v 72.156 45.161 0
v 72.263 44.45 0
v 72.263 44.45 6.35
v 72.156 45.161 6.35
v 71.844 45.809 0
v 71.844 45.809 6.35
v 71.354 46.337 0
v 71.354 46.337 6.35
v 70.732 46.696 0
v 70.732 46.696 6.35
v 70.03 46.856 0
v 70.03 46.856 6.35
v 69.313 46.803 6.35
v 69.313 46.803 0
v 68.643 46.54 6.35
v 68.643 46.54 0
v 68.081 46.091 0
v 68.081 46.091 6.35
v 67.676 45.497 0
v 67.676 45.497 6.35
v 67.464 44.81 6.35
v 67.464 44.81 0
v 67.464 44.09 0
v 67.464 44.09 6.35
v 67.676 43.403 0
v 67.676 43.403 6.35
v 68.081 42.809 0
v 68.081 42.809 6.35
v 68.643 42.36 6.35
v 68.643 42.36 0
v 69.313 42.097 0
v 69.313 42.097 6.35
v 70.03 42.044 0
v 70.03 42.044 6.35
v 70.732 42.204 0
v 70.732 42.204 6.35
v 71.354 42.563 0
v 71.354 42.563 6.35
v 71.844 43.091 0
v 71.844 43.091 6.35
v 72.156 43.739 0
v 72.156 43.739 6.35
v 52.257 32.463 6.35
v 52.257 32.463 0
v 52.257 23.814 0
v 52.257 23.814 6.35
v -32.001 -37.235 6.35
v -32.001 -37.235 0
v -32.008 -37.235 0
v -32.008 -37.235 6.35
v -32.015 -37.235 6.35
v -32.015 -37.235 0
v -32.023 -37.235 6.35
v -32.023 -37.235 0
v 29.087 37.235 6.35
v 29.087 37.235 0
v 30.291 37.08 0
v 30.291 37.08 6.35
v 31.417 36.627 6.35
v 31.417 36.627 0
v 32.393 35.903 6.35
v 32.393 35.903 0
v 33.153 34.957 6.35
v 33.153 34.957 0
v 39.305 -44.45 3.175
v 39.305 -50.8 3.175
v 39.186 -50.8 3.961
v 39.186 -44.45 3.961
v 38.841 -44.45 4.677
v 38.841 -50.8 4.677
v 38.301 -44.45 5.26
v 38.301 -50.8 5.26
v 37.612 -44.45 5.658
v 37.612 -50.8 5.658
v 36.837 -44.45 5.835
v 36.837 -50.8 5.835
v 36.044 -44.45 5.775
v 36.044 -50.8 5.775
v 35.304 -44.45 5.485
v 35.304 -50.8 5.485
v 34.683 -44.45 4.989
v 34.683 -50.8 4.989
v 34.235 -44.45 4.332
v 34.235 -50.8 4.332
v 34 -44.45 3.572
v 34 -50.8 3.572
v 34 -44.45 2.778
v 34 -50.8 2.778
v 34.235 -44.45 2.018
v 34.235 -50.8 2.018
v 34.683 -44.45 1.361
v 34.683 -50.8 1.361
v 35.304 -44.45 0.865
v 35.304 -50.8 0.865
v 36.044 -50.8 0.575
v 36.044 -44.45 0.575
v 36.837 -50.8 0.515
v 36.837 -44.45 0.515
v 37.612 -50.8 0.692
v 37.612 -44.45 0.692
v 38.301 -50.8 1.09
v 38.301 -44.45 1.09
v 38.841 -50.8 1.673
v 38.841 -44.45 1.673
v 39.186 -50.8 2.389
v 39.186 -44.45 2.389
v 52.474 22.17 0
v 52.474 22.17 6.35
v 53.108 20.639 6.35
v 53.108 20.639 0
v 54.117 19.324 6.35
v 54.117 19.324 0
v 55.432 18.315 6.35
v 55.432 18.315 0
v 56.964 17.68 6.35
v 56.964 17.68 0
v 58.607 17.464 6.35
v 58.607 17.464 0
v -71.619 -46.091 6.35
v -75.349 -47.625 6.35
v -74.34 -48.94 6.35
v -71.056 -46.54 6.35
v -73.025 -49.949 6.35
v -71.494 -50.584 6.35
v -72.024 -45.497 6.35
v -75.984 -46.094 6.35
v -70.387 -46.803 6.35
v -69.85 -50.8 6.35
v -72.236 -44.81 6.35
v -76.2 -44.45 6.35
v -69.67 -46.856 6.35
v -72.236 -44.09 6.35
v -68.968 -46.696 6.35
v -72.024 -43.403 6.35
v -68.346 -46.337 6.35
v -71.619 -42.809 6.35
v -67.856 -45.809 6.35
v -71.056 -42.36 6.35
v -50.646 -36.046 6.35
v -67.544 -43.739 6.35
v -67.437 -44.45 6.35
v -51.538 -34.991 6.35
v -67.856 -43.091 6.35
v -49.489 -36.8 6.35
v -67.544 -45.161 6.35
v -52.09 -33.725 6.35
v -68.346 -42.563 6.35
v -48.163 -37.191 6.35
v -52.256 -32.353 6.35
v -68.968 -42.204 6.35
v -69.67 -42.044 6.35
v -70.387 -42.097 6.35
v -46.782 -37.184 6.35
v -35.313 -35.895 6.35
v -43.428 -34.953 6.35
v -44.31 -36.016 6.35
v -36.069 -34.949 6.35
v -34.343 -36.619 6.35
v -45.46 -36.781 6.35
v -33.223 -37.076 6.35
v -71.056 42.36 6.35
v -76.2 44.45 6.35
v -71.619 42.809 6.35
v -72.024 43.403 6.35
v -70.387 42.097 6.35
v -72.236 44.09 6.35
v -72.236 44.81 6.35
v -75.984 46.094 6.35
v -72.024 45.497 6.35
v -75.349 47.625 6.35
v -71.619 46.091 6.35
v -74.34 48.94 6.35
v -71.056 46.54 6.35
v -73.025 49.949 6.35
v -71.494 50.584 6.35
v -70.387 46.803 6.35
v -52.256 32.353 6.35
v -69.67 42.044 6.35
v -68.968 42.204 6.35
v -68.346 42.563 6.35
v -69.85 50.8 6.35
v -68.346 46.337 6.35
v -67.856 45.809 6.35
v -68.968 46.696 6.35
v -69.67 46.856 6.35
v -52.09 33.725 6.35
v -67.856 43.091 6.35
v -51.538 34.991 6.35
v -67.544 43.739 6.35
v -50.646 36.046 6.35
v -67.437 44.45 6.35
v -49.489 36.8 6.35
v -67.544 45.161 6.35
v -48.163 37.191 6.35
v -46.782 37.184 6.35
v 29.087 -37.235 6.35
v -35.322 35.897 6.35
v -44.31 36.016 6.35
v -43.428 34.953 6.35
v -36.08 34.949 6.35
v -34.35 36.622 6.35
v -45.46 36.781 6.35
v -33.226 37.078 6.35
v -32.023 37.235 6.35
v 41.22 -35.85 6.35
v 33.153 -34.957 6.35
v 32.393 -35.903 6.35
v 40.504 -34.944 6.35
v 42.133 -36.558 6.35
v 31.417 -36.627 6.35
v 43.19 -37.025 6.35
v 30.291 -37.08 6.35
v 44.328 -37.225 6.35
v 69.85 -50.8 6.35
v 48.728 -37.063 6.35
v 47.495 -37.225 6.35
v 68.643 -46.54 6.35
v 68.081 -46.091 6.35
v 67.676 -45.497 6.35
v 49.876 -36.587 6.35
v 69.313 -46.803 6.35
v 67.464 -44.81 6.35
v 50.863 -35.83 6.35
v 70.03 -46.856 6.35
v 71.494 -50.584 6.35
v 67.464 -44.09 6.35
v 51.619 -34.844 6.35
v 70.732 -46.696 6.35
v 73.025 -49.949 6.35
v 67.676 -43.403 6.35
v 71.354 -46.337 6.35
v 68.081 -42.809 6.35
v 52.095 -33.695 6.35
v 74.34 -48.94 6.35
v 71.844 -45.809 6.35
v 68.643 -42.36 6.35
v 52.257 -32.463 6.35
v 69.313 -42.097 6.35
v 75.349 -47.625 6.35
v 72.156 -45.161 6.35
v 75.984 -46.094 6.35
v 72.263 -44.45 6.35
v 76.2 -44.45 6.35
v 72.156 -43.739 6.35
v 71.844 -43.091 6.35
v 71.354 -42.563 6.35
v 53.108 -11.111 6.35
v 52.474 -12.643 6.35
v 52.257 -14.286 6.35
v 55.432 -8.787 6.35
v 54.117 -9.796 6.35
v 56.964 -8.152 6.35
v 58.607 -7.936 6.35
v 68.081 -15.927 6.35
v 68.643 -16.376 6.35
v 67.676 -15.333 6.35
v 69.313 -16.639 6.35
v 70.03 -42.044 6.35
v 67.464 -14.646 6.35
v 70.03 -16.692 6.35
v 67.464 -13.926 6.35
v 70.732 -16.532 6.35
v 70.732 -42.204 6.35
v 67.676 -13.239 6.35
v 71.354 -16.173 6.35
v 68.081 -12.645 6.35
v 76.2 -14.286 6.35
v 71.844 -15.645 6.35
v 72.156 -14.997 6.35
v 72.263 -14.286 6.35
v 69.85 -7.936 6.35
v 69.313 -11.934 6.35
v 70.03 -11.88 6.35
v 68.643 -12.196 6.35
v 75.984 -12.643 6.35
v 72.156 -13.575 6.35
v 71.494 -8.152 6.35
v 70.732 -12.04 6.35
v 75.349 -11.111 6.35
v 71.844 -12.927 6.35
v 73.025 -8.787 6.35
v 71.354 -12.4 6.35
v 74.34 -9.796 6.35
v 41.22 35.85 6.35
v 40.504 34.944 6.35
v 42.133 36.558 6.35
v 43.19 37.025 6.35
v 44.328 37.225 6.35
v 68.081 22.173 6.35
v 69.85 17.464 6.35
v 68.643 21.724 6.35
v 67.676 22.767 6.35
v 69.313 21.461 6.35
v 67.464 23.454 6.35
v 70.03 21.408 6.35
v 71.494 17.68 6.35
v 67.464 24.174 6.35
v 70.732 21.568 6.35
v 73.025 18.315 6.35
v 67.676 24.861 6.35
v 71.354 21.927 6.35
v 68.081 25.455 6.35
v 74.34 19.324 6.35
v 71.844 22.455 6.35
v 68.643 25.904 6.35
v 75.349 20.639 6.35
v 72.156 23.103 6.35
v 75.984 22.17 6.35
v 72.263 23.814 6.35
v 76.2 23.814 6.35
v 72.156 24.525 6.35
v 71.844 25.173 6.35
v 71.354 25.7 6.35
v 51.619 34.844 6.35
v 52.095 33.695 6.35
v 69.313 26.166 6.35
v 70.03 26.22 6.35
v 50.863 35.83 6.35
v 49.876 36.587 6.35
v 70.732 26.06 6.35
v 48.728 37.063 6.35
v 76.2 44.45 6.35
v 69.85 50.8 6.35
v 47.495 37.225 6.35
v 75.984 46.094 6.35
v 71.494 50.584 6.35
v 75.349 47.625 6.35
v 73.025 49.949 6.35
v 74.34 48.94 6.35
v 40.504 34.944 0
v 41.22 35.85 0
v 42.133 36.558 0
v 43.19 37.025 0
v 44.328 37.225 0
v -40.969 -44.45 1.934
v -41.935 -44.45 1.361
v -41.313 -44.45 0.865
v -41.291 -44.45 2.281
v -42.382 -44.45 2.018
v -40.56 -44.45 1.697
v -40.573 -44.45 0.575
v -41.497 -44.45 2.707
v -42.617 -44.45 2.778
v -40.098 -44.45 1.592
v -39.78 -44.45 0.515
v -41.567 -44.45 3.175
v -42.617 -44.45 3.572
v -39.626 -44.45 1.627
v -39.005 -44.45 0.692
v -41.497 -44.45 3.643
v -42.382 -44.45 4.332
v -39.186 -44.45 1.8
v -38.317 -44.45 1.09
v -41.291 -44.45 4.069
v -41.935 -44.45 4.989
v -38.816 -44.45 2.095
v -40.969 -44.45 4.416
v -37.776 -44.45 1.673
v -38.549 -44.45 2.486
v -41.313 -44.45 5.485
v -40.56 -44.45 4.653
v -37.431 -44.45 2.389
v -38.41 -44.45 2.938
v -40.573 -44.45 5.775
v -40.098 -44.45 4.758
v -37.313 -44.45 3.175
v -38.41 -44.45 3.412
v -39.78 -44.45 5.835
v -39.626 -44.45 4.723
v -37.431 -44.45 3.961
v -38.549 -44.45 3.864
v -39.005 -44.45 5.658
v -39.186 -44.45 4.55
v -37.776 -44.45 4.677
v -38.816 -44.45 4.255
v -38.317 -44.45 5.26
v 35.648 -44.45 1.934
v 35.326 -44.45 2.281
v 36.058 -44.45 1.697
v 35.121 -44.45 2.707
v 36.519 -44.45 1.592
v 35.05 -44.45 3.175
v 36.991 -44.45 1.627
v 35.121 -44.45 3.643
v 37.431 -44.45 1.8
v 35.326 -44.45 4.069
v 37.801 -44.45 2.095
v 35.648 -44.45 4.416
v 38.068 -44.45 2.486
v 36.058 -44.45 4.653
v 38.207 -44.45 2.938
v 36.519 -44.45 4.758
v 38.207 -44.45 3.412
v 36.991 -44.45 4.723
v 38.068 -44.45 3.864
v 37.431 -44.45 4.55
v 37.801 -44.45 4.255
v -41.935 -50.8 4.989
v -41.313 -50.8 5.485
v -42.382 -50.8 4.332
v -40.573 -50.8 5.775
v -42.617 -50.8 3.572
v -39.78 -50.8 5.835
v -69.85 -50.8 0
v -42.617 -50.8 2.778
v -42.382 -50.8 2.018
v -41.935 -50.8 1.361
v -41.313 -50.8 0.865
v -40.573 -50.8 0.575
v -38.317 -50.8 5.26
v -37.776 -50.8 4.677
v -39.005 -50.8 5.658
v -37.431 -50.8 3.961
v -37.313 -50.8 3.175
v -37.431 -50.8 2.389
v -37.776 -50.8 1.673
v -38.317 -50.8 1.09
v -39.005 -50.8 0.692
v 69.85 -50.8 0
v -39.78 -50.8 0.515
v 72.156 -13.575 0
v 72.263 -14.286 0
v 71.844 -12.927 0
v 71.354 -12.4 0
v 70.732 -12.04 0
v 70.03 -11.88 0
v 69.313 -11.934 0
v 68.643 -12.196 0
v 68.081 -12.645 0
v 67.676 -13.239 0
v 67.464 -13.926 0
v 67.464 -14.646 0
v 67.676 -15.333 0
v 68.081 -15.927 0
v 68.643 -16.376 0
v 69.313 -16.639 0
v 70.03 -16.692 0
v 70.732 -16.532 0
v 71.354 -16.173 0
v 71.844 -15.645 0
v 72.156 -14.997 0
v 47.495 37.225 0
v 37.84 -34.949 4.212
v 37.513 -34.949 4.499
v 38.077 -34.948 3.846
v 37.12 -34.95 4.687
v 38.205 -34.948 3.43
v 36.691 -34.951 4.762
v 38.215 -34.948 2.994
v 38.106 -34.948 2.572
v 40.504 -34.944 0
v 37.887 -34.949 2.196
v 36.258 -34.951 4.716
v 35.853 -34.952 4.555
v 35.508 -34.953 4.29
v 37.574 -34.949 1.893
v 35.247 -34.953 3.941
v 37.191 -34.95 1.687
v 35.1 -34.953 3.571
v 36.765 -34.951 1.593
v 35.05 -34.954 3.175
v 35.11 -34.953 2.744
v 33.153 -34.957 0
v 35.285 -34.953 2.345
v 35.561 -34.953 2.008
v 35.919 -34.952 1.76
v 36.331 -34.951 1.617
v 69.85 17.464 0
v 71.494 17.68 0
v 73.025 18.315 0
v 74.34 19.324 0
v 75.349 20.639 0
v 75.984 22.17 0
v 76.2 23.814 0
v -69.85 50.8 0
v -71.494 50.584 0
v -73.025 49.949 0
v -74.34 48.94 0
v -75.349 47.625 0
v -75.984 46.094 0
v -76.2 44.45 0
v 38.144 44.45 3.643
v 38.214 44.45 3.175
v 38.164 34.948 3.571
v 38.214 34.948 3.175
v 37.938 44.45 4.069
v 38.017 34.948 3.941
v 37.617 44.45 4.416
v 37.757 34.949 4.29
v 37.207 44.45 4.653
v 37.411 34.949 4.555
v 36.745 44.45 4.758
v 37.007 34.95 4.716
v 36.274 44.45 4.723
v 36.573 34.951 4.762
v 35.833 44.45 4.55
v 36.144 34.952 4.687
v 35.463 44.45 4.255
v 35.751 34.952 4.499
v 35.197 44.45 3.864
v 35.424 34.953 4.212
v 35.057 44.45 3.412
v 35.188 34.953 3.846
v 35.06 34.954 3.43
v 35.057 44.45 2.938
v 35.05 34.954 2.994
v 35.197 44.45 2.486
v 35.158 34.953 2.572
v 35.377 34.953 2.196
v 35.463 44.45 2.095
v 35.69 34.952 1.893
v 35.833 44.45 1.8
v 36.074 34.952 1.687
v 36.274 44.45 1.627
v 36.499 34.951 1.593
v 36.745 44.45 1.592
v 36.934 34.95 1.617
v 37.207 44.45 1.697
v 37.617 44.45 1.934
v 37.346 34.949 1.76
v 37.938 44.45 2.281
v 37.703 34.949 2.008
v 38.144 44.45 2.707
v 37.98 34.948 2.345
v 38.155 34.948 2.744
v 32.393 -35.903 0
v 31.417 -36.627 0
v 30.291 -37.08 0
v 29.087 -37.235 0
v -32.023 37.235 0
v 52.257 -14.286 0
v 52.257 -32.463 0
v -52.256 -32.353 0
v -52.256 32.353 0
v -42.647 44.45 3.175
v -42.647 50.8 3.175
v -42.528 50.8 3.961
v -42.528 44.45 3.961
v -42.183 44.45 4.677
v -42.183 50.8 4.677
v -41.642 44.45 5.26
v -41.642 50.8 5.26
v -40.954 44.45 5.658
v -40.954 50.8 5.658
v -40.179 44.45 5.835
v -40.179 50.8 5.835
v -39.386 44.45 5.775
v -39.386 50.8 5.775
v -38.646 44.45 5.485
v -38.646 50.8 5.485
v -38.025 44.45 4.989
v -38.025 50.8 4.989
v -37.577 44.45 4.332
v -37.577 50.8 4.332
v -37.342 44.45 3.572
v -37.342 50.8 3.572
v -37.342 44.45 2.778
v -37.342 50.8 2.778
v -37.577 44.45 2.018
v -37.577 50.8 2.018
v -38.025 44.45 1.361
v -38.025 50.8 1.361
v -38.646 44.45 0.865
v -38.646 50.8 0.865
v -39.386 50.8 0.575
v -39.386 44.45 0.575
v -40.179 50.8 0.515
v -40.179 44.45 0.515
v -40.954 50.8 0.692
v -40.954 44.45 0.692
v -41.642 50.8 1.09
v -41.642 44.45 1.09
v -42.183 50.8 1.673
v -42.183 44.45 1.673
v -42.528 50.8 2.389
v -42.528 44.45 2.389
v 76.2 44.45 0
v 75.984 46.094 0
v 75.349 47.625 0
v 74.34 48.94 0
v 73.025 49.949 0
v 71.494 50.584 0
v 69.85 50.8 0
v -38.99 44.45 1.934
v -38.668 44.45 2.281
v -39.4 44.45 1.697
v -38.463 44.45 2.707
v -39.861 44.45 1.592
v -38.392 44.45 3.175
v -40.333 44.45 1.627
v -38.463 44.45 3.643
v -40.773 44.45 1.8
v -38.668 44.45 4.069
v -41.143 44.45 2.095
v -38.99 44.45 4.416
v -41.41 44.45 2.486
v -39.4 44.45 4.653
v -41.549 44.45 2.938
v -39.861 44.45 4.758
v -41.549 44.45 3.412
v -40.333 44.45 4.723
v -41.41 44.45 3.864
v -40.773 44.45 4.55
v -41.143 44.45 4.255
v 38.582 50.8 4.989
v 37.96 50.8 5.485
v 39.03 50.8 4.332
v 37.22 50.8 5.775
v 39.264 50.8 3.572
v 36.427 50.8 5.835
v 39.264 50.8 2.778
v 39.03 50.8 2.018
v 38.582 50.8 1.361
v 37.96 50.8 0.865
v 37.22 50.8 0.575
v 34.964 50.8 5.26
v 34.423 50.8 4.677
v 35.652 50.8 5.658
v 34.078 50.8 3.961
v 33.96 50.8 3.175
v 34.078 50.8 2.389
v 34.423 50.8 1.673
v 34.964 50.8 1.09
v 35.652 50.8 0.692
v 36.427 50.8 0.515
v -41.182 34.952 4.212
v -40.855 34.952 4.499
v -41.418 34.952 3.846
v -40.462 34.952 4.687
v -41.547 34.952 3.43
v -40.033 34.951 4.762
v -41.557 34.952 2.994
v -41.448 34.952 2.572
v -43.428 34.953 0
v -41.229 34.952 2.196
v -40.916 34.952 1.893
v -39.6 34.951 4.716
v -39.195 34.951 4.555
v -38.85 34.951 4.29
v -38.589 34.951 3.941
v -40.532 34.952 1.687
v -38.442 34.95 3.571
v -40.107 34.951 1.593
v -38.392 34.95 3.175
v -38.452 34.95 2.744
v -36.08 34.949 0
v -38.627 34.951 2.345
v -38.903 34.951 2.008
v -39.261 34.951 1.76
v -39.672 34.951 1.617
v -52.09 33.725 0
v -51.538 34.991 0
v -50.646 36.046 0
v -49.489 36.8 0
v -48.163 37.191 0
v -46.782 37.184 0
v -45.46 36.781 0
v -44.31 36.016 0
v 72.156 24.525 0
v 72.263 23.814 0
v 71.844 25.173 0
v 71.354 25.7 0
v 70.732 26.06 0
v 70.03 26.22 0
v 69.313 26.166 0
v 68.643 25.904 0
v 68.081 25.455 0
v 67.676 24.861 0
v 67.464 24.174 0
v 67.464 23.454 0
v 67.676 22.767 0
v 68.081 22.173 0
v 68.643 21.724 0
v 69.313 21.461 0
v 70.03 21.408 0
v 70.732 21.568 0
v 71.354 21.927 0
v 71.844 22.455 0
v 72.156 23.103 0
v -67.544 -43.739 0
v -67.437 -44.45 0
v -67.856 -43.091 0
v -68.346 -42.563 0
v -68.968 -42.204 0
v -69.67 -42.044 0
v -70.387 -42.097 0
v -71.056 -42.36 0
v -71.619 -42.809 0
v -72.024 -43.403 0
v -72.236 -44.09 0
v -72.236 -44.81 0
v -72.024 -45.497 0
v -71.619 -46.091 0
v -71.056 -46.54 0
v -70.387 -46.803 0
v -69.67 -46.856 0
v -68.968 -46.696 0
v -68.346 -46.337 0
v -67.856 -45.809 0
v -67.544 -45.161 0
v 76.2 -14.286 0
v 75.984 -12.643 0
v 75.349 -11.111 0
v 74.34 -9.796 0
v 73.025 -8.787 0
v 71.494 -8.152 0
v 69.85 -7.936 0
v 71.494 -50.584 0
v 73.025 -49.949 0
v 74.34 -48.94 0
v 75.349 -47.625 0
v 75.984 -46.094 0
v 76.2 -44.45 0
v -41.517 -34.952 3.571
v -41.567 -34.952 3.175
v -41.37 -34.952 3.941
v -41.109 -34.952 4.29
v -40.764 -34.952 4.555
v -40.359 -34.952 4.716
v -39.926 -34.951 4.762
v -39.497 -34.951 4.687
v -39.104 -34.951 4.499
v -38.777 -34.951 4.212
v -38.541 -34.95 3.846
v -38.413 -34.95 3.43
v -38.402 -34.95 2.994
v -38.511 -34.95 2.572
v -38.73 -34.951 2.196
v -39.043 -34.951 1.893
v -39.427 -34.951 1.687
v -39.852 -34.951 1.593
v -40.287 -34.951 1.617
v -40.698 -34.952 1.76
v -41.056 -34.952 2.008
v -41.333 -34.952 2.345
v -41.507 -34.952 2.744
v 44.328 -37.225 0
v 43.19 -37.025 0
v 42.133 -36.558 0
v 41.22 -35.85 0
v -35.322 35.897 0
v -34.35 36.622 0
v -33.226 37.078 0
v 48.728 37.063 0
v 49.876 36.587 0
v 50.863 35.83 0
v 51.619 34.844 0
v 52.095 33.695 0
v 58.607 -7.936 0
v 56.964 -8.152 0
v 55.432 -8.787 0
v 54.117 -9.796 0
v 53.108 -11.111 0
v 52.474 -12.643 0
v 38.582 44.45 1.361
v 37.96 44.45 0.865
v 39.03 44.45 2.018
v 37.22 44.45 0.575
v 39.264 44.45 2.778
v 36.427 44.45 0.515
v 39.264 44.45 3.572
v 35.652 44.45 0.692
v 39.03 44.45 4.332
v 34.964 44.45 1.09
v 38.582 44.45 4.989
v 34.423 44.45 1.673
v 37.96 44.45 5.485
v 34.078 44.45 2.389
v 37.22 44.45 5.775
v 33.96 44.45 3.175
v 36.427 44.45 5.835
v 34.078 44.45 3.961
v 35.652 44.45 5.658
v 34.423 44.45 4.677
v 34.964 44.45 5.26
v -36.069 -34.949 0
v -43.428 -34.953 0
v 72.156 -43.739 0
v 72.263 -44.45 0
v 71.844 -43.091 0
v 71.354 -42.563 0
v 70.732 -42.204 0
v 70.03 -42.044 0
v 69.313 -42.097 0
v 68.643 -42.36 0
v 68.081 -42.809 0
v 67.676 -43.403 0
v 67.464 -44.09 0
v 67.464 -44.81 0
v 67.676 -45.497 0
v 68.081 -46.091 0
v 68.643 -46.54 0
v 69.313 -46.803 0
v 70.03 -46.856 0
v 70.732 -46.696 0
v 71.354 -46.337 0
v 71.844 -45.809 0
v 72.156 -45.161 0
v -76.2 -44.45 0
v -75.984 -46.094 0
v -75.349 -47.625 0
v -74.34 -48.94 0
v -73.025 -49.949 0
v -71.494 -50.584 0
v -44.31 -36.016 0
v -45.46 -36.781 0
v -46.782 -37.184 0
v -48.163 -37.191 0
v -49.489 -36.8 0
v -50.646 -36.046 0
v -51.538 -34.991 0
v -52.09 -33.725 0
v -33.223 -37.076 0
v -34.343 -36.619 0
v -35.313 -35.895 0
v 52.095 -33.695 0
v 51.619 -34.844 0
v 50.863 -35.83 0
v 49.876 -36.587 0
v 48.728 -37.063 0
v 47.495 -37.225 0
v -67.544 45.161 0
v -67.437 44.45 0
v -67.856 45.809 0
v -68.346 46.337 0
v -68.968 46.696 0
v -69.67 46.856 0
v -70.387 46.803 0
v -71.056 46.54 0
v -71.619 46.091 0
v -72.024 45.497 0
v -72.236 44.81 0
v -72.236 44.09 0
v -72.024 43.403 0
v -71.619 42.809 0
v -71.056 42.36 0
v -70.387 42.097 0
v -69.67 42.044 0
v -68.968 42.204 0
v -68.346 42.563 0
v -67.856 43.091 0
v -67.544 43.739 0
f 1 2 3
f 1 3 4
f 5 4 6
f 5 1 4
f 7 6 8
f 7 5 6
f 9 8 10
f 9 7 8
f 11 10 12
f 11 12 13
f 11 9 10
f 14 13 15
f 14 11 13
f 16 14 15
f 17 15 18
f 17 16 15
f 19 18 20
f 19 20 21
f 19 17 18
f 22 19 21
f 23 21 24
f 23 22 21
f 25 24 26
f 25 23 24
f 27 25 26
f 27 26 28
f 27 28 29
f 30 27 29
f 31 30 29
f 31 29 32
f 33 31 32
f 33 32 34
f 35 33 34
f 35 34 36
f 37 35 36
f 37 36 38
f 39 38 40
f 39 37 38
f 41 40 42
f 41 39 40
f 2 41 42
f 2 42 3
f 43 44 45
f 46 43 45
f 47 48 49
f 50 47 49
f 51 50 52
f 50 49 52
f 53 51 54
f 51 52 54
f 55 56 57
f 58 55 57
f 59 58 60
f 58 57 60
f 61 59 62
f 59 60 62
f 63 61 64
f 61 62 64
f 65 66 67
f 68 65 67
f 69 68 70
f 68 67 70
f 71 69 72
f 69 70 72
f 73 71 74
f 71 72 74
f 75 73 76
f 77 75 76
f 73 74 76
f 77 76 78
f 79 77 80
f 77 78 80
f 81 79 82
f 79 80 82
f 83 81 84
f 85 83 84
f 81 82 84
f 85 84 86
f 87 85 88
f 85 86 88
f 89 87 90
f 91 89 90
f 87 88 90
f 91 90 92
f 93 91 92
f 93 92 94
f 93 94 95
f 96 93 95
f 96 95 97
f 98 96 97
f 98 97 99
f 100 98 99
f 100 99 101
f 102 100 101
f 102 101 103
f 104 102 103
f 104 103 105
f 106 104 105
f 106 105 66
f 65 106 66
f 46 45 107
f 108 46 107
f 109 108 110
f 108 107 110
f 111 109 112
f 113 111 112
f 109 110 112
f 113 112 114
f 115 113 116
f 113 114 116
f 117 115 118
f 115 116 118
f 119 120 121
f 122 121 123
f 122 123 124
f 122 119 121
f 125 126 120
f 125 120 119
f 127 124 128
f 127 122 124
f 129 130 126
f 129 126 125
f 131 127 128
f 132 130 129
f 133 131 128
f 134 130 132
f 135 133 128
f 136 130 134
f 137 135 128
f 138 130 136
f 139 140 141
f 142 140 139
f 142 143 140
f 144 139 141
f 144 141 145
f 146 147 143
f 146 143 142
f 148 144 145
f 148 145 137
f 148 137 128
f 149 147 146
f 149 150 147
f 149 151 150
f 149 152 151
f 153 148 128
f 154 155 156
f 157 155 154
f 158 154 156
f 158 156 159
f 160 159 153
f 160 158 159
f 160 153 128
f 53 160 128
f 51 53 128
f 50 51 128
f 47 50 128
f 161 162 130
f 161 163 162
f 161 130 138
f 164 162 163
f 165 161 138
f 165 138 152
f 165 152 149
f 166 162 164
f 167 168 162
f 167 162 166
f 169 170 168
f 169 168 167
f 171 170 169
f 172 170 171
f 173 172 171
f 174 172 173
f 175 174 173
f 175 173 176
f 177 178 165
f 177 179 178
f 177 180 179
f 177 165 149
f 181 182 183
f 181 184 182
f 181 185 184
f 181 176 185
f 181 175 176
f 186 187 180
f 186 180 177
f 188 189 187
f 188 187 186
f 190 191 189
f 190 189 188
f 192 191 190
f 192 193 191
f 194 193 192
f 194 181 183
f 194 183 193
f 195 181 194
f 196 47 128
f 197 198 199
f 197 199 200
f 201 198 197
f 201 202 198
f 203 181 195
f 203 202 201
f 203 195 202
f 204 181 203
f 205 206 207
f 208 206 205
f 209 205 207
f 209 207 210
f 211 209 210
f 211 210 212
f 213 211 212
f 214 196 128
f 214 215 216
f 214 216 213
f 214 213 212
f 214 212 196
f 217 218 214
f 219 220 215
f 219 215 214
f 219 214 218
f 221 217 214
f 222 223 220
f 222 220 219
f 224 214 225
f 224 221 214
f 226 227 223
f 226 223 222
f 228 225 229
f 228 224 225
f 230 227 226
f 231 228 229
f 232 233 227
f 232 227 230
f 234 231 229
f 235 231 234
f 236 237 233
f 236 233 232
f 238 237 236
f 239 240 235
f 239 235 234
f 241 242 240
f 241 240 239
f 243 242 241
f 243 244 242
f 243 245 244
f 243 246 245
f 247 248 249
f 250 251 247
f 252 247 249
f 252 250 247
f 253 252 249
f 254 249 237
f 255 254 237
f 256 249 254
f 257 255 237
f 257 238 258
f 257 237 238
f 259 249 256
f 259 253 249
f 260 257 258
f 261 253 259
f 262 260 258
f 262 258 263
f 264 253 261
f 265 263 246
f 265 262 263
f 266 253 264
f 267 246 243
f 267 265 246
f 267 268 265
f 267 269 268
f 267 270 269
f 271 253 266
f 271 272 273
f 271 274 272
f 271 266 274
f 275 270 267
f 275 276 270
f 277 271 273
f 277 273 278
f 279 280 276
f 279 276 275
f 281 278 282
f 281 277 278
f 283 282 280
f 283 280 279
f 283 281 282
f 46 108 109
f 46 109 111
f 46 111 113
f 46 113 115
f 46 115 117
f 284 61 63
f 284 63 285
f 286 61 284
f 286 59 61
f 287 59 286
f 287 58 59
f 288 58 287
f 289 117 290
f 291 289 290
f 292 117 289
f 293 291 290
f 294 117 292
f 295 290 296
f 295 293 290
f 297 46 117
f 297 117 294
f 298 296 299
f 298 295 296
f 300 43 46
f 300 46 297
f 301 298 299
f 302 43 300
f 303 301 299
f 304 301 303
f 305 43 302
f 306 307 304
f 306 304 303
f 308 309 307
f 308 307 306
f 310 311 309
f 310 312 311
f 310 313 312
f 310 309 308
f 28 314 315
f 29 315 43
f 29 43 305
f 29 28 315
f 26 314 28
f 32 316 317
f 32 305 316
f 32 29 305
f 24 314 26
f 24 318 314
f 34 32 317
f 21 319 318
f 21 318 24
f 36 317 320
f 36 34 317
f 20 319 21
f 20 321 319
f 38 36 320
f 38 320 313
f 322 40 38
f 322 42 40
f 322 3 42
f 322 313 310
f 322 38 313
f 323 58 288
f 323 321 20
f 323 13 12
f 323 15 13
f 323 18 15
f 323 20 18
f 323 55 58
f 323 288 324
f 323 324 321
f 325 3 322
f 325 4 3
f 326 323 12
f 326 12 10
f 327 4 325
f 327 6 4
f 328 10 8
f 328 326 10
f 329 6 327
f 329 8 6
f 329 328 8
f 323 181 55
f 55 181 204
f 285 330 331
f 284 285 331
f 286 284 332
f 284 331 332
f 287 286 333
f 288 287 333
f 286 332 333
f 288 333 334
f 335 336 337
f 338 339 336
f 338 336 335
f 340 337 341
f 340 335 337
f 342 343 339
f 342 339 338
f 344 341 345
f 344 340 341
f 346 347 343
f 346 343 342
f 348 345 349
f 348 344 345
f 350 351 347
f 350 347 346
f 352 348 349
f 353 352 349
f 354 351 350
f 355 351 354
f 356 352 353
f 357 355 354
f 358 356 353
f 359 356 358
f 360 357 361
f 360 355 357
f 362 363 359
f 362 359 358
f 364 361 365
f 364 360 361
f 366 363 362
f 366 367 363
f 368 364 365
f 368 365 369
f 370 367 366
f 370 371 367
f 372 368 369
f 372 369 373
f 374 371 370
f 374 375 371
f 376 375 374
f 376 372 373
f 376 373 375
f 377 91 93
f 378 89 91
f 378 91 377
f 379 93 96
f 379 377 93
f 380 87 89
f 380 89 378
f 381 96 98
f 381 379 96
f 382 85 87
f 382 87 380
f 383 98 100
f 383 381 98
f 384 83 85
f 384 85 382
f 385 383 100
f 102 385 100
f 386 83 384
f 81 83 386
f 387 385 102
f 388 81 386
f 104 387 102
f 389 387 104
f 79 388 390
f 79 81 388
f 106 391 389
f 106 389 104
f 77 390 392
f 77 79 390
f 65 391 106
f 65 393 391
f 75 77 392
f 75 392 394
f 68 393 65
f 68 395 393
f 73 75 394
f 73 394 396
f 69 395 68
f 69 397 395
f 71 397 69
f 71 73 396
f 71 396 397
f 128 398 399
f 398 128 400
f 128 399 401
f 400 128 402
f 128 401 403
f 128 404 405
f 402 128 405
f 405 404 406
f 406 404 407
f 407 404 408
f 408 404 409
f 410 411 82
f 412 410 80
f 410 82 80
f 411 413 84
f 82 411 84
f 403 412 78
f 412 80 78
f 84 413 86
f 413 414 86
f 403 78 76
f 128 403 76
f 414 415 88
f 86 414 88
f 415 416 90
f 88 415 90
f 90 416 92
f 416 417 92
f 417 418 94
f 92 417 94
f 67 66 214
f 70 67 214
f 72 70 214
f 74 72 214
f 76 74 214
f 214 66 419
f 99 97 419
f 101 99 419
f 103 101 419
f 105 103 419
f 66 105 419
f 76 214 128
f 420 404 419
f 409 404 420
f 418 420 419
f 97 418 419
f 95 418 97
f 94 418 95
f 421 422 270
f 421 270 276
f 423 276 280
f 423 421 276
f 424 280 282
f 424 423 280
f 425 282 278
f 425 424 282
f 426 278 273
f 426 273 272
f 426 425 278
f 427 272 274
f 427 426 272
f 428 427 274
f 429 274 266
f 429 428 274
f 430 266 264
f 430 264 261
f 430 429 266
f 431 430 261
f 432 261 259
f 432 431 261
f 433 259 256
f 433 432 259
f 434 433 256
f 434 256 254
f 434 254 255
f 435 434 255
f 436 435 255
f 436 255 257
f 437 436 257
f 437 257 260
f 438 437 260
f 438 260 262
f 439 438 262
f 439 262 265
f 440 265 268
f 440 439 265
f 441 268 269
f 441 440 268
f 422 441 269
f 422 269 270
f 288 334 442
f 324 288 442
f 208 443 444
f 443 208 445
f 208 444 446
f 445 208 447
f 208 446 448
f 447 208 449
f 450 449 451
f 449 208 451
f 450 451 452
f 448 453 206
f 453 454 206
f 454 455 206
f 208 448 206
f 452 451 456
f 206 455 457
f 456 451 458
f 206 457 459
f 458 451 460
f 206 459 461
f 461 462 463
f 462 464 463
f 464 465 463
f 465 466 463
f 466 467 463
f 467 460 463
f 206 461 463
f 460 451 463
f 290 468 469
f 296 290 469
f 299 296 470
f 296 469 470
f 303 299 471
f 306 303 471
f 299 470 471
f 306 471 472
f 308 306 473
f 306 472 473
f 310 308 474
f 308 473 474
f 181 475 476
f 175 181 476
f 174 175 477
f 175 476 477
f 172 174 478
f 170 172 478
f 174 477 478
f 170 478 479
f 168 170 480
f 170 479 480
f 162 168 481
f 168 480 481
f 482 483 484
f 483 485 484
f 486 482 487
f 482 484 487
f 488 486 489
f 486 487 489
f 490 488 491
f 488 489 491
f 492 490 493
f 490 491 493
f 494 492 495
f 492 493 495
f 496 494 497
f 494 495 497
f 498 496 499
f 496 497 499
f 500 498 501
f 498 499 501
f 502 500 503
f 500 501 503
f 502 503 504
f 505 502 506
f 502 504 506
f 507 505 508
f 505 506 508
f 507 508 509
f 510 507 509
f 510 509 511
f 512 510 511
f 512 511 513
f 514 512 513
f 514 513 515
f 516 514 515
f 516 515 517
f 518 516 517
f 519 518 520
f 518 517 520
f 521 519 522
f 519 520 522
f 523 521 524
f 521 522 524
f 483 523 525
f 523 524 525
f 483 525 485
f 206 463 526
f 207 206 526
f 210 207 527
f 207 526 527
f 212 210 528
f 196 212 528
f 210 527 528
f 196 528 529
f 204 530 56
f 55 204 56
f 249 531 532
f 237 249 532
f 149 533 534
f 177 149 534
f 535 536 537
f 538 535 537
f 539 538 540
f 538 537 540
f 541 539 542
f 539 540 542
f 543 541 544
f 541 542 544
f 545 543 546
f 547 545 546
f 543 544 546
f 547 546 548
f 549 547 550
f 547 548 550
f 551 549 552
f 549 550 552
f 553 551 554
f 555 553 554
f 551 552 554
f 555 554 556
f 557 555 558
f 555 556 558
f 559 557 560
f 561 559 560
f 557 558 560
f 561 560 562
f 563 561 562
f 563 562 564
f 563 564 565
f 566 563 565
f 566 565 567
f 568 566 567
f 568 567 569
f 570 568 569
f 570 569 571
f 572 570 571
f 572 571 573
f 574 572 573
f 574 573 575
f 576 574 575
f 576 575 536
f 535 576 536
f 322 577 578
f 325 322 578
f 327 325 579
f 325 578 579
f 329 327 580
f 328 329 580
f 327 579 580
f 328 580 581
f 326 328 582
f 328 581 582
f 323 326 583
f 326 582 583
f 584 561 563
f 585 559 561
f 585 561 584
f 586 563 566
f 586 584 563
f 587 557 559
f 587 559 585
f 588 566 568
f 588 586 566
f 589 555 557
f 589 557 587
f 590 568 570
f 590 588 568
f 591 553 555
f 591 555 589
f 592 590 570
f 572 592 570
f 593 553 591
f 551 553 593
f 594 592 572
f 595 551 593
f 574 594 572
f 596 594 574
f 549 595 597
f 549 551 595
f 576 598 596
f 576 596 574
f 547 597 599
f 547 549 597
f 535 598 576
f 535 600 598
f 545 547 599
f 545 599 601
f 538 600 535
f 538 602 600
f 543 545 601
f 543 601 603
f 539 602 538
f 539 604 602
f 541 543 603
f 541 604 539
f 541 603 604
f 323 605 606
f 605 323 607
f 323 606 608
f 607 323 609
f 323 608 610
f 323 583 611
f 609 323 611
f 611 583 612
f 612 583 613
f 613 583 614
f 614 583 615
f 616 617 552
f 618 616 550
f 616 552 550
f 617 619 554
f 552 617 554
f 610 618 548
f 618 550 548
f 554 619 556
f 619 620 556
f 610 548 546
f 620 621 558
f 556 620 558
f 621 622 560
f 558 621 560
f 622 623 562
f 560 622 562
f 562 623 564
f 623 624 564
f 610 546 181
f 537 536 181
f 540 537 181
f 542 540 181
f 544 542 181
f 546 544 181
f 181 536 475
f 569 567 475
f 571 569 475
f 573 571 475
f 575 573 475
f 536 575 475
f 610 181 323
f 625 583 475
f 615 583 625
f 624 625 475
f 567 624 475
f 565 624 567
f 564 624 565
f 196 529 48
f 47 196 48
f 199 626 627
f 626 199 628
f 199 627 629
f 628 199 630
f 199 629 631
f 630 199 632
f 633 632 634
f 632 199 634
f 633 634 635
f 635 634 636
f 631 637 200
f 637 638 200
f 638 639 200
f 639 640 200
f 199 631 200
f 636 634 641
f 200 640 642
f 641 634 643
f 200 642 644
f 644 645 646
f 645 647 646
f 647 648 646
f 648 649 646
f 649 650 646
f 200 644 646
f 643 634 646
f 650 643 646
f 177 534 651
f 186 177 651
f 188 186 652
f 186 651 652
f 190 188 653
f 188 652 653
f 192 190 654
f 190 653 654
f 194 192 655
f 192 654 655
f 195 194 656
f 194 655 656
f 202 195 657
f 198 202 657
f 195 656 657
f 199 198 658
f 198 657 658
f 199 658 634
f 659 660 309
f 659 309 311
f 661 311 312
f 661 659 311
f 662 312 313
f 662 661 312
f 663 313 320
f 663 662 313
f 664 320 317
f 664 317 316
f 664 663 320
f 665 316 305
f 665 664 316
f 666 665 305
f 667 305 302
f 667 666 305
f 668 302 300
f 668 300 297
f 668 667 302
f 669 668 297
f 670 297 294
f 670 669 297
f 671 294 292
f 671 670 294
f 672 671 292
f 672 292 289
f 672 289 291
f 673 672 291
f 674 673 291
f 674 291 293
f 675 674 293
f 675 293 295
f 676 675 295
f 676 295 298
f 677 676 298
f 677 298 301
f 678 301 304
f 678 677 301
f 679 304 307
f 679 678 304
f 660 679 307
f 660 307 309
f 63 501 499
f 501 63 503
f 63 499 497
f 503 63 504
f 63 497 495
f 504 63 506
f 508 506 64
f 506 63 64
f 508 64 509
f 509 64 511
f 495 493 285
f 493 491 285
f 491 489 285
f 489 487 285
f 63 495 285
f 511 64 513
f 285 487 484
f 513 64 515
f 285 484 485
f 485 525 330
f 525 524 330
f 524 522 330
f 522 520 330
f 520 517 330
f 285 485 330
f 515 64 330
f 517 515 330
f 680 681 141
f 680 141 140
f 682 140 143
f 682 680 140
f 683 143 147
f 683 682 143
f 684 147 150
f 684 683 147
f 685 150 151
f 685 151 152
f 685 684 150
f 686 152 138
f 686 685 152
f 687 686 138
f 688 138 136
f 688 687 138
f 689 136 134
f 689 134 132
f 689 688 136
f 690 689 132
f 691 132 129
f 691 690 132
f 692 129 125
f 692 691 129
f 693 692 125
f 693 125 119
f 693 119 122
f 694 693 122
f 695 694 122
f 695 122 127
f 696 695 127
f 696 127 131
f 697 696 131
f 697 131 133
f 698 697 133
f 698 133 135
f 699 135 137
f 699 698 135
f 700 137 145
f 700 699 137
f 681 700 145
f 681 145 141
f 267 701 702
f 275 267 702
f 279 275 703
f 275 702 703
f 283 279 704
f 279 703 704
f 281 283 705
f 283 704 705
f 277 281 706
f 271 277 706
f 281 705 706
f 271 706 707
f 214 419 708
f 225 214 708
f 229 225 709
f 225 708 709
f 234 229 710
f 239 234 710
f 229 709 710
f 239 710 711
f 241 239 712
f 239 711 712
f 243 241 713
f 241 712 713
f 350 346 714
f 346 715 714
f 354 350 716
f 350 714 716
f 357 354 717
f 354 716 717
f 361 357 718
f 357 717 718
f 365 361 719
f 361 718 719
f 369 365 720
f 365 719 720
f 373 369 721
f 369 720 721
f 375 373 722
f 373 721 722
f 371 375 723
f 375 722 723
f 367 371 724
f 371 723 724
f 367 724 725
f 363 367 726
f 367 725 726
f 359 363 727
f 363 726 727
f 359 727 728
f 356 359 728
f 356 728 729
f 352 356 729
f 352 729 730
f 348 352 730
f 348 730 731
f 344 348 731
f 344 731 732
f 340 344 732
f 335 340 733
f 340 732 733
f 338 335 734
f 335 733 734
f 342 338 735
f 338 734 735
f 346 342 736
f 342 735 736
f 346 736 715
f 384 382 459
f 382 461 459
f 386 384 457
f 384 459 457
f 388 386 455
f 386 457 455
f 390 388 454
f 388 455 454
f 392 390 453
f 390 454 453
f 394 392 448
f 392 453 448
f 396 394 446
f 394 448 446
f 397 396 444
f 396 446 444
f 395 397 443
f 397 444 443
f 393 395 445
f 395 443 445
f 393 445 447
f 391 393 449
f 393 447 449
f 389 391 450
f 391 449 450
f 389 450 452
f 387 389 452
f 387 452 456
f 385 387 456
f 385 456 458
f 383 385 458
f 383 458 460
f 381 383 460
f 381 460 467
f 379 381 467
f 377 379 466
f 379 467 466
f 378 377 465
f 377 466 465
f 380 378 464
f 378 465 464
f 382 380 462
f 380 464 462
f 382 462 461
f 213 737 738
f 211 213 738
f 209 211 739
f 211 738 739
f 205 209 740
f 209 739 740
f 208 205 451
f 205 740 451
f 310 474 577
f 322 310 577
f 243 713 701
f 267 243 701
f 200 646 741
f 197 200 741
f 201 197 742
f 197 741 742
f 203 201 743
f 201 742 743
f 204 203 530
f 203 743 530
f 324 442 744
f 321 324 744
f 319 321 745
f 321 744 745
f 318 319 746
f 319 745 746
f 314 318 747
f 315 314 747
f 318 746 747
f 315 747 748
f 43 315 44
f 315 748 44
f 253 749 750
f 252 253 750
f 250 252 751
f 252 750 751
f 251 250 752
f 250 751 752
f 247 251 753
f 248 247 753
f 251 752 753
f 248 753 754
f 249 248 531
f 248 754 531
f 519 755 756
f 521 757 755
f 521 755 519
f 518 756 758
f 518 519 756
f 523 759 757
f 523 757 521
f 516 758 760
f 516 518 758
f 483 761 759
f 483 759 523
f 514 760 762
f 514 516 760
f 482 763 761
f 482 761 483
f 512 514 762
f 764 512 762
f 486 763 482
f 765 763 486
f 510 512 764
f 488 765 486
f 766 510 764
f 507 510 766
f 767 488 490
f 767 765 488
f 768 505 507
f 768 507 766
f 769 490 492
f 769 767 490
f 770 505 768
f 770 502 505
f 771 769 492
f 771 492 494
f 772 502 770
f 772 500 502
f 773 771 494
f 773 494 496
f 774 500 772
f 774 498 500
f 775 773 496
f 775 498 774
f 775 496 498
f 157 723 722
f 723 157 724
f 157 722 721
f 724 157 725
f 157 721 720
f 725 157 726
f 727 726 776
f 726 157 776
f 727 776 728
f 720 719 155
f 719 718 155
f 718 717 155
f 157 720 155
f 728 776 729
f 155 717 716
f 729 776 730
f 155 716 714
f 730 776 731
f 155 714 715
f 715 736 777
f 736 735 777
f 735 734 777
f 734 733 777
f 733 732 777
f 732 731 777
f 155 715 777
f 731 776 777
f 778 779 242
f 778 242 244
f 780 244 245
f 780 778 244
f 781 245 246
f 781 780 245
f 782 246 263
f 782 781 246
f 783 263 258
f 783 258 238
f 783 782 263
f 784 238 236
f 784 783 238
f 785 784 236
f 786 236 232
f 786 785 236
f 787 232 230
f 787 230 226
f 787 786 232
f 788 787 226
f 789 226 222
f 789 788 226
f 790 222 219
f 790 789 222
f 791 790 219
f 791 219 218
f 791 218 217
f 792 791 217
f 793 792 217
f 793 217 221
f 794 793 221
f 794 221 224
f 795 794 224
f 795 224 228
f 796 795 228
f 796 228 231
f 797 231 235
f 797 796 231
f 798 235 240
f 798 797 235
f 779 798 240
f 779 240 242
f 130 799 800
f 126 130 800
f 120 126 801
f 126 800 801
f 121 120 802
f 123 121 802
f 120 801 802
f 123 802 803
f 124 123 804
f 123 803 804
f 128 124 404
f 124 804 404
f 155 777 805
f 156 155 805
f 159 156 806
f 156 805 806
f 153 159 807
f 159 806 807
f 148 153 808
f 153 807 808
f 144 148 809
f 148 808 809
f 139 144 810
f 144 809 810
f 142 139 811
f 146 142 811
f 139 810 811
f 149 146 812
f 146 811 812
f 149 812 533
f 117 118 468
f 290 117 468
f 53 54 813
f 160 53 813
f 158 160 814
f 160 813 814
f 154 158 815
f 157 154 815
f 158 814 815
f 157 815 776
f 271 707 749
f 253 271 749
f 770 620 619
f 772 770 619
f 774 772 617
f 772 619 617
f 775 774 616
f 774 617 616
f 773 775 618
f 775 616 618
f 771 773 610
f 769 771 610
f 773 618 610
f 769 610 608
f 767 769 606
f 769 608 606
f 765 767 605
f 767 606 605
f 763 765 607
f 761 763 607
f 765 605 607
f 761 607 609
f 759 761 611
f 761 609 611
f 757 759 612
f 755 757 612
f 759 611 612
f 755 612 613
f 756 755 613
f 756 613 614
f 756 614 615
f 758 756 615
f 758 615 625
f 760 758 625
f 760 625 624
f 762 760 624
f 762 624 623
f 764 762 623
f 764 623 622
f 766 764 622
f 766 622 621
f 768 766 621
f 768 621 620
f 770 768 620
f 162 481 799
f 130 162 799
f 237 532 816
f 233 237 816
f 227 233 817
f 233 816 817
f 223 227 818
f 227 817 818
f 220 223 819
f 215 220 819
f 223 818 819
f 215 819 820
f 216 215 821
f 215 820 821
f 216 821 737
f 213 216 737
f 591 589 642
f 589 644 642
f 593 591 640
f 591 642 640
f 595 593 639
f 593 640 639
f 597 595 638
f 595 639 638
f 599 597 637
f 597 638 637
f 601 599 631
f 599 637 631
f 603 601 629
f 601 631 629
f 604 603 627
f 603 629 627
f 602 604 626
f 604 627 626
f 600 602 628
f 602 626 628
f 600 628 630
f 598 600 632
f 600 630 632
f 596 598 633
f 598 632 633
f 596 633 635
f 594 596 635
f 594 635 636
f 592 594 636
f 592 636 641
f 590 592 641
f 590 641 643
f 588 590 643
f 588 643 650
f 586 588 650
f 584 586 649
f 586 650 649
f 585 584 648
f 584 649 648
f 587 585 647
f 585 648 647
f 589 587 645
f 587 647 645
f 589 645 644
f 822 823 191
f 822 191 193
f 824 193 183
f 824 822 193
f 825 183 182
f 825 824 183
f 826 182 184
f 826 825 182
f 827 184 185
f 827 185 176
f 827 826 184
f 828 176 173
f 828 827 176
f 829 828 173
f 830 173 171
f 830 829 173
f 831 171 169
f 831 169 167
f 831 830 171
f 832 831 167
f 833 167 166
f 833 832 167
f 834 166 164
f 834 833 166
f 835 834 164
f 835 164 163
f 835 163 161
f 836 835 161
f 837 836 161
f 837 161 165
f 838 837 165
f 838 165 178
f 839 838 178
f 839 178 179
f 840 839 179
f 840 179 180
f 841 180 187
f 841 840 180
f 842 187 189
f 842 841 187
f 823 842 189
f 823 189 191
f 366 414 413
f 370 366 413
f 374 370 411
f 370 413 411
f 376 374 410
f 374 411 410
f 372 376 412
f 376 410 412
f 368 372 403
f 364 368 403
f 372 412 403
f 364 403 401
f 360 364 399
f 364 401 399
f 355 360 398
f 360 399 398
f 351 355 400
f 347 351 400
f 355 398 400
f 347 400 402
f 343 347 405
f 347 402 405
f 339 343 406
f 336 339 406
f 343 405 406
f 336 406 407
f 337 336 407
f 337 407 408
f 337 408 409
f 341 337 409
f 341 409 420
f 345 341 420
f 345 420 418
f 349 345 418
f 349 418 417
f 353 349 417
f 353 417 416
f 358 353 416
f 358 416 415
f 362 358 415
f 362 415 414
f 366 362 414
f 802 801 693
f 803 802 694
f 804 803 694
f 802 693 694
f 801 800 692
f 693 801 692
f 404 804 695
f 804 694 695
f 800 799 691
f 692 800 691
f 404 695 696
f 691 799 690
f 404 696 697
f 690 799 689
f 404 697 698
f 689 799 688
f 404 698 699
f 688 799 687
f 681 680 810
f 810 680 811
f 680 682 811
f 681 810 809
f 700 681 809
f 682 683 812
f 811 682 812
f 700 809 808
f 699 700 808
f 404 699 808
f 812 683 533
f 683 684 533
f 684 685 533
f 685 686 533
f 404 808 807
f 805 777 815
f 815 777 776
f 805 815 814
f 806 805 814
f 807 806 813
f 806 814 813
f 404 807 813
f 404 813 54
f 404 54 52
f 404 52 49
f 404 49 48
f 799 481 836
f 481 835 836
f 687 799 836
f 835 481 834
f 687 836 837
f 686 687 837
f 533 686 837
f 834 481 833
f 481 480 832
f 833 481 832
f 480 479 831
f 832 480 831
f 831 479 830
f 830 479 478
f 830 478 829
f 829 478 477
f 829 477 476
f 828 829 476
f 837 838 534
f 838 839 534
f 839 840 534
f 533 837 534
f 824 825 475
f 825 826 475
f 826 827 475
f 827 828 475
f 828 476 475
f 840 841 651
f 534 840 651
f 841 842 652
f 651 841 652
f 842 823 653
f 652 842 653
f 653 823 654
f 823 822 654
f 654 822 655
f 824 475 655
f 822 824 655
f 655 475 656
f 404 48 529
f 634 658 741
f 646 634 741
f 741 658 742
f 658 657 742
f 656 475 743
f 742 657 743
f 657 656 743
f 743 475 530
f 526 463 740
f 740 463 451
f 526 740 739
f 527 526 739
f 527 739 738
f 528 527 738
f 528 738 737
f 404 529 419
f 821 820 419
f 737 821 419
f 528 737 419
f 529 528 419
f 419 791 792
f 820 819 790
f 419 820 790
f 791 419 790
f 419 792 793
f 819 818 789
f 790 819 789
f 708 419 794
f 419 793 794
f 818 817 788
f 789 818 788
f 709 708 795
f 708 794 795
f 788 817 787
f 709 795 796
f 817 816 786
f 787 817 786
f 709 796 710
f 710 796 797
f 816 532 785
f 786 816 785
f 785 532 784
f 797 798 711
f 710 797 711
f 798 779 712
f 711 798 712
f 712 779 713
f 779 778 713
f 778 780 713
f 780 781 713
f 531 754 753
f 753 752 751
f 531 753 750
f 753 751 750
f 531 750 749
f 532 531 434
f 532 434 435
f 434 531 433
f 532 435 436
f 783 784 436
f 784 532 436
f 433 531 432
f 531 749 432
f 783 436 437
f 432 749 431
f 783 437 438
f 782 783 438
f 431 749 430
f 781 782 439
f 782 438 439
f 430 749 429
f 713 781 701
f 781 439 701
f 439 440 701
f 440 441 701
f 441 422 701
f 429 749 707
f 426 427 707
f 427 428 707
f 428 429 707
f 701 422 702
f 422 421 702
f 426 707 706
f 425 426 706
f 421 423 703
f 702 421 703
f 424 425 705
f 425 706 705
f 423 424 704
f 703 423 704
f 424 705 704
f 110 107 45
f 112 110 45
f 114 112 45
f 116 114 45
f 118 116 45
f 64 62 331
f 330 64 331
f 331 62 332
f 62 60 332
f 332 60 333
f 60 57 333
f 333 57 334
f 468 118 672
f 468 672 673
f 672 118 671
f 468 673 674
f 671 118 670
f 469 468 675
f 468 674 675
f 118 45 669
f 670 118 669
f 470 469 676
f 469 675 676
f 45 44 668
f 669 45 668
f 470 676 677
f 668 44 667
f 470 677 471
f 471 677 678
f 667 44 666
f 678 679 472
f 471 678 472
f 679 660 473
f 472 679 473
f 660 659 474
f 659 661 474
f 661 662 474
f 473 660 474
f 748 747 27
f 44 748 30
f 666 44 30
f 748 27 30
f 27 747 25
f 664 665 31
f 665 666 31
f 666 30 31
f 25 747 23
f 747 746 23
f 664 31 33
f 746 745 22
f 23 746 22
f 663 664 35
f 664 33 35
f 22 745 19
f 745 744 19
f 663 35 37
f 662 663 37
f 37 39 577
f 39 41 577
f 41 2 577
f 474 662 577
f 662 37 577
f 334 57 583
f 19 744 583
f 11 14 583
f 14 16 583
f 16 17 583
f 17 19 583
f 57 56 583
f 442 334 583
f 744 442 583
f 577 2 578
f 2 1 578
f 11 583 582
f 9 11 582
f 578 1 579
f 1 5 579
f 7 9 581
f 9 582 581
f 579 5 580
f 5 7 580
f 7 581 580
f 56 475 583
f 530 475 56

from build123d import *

# Parameters (mm, degrees)
F0_R           = 2.413
F1_DEPTH       = 6.35
F3_D           = 3.175
F3_DEPTH       = 15.875
F3_CBORE_D     = 5.334
F3_CBORE_DEPTH = 6.35
F3_TIP         = 0.9538662327
F5_D           = 3.175
F5_DEPTH       = 15.875
F5_CBORE_D     = 5.334
F5_CBORE_DEPTH = 6.35
F5_TIP         = 0.9538662327


# Not quite as in the source:
# - ends of sketch curves that miss each other by under 0.0002 mm in the source are joined


with BuildPart() as f1:
    # F0 (on Top) → F1 (new body)
    with BuildSketch(Plane.XY):
        with BuildLine():
            Line((69.85, 50.8), (-69.85, 50.8))
            ThreePointArc((-69.85, 50.8), (-74.3401280605, 48.9401280605), (-76.2, 44.45))
            Line((-76.2, 44.45), (-76.2, -44.45))
            ThreePointArc((-76.2, -44.45), (-74.3401280605, -48.9401280605), (-69.85, -50.8))
            Line((-69.85, -50.8), (69.85, -50.8))
            ThreePointArc((69.85, -50.8), (74.3401280605, -48.9401280605), (76.2, -44.45))
            Line((76.2, -44.45), (76.2, -14.2860641539))
            ThreePointArc((76.2, -14.2860641539), (74.3401280605, -9.7959360934), (69.85, -7.9360641539))
            Line((69.85, -7.9360641539), (58.6074946763, -7.9360641539))
            ThreePointArc((58.6074946763, -7.9360641539), (54.1173666157, -9.7959360934), (52.2574946763, -14.2860641539))
            Line((52.2574946763, -14.2860641539), (52.2574946763, -32.4625809134))
            ThreePointArc((52.2574946763, -32.4625809134), (50.8625907217, -35.8301769588), (47.4949946763, -37.2250809134))
            Line((47.4949946763, -37.2250809134), (44.3277485112, -37.2250809134))
            ThreePointArc((44.3277485112, -37.2250809134), (42.13331562, -36.5581056788), (40.5040542932, -34.9438258992))
            Line((40.5040542932, -34.9438258992), (33.1534721252, -34.9569741008))
            ThreePointArc((33.1534721252, -34.9569741008), (31.4174339307, -36.6267371458), (29.0867928871, -37.2350541396))
            Line((29.0867928871, -37.2350541396), (-32.0008653101, -37.2349356495))
            ThreePointArc((-32.0008653101, -37.2349356495), (-32.011823158, -37.2349229987), (-32.0227809478, -37.23488518))
            ThreePointArc((-32.0227809478, -37.23488518), (-34.343480333, -36.6189475252), (-36.0687477759, -34.9490741523))
            Line((-36.0687477759, -34.9490741523), (-43.4277583378, -34.9532397009))
            ThreePointArc((-43.4277583378, -34.9532397009), (-48.8402121166, -37.0437819519), (-52.2557695883, -32.3534738631))
            Line((-52.2557695883, -32.3534738631), (-52.2557695883, 32.3534738631))
            ThreePointArc((-52.2557695883, 32.3534738631), (-48.8402121166, 37.0437819519), (-43.4277583378, 34.9532397009))
            Line((-43.4277583378, 34.9532397009), (-36.0798295377, 34.9490804251))
            ThreePointArc((-36.0798295377, 34.9490804251), (-34.3499401325, 36.6220397206), (-32.0227811798, 37.2349356069))
            Line((-32.0227811798, 37.2349356069), (29.0868021404, 37.2350541396))
            ThreePointArc((29.0868021404, 37.2350541396), (31.4174339307, 36.6267371458), (33.1534721252, 34.9569741008))
            Line((33.1534721252, 34.9569741008), (40.5040542932, 34.9438258992))
            ThreePointArc((40.5040542932, 34.9438258992), (42.13331562, 36.5581056788), (44.3277485112, 37.2250809134))
            Line((44.3277485112, 37.2250809134), (47.4949946763, 37.2250809134))
            ThreePointArc((47.4949946763, 37.2250809134), (50.8625907217, 35.8301769588), (52.2574946763, 32.4625809134))
            Line((52.2574946763, 32.4625809134), (52.2574946763, 23.8139358461))
            ThreePointArc((52.2574946763, 23.8139358461), (54.1173666157, 19.3238077856), (58.6074946763, 17.4639358461))
            Line((58.6074946763, 17.4639358461), (69.85, 17.4639358461))
            ThreePointArc((69.85, 17.4639358461), (74.3401280605, 19.3238077856), (76.2, 23.8139358461))
            Line((76.2, 23.8139358461), (76.2, 44.45))
            ThreePointArc((76.2, 44.45), (74.3401280605, 48.9401280605), (69.85, 50.8))
        make_face()
        with Locations((-69.85, -44.45)):
            Circle(F0_R, mode=Mode.SUBTRACT)
        with Locations((69.85, -44.45)):
            Circle(F0_R, mode=Mode.SUBTRACT)
        with Locations((69.85, -14.2860641539)):
            Circle(F0_R, mode=Mode.SUBTRACT)
        with Locations((-69.85, 44.45)):
            Circle(F0_R, mode=Mode.SUBTRACT)
        with Locations((69.85, 23.8139358461)):
            Circle(F0_R, mode=Mode.SUBTRACT)
        with Locations((69.85, 44.45)):
            Circle(F0_R, mode=Mode.SUBTRACT)
    extrude(amount=F1_DEPTH)

    # F3
    with Locations(Plane.XZ.offset(50.8)):
        with Locations((-39.9796, 3.175), (36.6377, 3.175)):
            CounterBoreHole(F3_D / 2, F3_CBORE_D / 2, F3_CBORE_DEPTH, depth=F3_DEPTH)
            with Locations((0, 0, -(F3_DEPTH + F3_TIP / 2))):  # 118° drill point
                Cone(0, F3_D / 2, F3_TIP, mode=Mode.SUBTRACT)

    # F5
    with Locations(Plane(origin=(0, 50.8, 0), x_dir=(-1, 0, 0), z_dir=(0, 1, 0))):
        with Locations((-36.6268, 3.175), (39.9796, 3.175)):
            CounterBoreHole(F5_D / 2, F5_CBORE_D / 2, F5_CBORE_DEPTH, depth=F5_DEPTH)
            with Locations((0, 0, -(F5_DEPTH + F5_TIP / 2))):  # 118° drill point
                Cone(0, F5_D / 2, F5_TIP, mode=Mode.SUBTRACT)


solid = f1.part
